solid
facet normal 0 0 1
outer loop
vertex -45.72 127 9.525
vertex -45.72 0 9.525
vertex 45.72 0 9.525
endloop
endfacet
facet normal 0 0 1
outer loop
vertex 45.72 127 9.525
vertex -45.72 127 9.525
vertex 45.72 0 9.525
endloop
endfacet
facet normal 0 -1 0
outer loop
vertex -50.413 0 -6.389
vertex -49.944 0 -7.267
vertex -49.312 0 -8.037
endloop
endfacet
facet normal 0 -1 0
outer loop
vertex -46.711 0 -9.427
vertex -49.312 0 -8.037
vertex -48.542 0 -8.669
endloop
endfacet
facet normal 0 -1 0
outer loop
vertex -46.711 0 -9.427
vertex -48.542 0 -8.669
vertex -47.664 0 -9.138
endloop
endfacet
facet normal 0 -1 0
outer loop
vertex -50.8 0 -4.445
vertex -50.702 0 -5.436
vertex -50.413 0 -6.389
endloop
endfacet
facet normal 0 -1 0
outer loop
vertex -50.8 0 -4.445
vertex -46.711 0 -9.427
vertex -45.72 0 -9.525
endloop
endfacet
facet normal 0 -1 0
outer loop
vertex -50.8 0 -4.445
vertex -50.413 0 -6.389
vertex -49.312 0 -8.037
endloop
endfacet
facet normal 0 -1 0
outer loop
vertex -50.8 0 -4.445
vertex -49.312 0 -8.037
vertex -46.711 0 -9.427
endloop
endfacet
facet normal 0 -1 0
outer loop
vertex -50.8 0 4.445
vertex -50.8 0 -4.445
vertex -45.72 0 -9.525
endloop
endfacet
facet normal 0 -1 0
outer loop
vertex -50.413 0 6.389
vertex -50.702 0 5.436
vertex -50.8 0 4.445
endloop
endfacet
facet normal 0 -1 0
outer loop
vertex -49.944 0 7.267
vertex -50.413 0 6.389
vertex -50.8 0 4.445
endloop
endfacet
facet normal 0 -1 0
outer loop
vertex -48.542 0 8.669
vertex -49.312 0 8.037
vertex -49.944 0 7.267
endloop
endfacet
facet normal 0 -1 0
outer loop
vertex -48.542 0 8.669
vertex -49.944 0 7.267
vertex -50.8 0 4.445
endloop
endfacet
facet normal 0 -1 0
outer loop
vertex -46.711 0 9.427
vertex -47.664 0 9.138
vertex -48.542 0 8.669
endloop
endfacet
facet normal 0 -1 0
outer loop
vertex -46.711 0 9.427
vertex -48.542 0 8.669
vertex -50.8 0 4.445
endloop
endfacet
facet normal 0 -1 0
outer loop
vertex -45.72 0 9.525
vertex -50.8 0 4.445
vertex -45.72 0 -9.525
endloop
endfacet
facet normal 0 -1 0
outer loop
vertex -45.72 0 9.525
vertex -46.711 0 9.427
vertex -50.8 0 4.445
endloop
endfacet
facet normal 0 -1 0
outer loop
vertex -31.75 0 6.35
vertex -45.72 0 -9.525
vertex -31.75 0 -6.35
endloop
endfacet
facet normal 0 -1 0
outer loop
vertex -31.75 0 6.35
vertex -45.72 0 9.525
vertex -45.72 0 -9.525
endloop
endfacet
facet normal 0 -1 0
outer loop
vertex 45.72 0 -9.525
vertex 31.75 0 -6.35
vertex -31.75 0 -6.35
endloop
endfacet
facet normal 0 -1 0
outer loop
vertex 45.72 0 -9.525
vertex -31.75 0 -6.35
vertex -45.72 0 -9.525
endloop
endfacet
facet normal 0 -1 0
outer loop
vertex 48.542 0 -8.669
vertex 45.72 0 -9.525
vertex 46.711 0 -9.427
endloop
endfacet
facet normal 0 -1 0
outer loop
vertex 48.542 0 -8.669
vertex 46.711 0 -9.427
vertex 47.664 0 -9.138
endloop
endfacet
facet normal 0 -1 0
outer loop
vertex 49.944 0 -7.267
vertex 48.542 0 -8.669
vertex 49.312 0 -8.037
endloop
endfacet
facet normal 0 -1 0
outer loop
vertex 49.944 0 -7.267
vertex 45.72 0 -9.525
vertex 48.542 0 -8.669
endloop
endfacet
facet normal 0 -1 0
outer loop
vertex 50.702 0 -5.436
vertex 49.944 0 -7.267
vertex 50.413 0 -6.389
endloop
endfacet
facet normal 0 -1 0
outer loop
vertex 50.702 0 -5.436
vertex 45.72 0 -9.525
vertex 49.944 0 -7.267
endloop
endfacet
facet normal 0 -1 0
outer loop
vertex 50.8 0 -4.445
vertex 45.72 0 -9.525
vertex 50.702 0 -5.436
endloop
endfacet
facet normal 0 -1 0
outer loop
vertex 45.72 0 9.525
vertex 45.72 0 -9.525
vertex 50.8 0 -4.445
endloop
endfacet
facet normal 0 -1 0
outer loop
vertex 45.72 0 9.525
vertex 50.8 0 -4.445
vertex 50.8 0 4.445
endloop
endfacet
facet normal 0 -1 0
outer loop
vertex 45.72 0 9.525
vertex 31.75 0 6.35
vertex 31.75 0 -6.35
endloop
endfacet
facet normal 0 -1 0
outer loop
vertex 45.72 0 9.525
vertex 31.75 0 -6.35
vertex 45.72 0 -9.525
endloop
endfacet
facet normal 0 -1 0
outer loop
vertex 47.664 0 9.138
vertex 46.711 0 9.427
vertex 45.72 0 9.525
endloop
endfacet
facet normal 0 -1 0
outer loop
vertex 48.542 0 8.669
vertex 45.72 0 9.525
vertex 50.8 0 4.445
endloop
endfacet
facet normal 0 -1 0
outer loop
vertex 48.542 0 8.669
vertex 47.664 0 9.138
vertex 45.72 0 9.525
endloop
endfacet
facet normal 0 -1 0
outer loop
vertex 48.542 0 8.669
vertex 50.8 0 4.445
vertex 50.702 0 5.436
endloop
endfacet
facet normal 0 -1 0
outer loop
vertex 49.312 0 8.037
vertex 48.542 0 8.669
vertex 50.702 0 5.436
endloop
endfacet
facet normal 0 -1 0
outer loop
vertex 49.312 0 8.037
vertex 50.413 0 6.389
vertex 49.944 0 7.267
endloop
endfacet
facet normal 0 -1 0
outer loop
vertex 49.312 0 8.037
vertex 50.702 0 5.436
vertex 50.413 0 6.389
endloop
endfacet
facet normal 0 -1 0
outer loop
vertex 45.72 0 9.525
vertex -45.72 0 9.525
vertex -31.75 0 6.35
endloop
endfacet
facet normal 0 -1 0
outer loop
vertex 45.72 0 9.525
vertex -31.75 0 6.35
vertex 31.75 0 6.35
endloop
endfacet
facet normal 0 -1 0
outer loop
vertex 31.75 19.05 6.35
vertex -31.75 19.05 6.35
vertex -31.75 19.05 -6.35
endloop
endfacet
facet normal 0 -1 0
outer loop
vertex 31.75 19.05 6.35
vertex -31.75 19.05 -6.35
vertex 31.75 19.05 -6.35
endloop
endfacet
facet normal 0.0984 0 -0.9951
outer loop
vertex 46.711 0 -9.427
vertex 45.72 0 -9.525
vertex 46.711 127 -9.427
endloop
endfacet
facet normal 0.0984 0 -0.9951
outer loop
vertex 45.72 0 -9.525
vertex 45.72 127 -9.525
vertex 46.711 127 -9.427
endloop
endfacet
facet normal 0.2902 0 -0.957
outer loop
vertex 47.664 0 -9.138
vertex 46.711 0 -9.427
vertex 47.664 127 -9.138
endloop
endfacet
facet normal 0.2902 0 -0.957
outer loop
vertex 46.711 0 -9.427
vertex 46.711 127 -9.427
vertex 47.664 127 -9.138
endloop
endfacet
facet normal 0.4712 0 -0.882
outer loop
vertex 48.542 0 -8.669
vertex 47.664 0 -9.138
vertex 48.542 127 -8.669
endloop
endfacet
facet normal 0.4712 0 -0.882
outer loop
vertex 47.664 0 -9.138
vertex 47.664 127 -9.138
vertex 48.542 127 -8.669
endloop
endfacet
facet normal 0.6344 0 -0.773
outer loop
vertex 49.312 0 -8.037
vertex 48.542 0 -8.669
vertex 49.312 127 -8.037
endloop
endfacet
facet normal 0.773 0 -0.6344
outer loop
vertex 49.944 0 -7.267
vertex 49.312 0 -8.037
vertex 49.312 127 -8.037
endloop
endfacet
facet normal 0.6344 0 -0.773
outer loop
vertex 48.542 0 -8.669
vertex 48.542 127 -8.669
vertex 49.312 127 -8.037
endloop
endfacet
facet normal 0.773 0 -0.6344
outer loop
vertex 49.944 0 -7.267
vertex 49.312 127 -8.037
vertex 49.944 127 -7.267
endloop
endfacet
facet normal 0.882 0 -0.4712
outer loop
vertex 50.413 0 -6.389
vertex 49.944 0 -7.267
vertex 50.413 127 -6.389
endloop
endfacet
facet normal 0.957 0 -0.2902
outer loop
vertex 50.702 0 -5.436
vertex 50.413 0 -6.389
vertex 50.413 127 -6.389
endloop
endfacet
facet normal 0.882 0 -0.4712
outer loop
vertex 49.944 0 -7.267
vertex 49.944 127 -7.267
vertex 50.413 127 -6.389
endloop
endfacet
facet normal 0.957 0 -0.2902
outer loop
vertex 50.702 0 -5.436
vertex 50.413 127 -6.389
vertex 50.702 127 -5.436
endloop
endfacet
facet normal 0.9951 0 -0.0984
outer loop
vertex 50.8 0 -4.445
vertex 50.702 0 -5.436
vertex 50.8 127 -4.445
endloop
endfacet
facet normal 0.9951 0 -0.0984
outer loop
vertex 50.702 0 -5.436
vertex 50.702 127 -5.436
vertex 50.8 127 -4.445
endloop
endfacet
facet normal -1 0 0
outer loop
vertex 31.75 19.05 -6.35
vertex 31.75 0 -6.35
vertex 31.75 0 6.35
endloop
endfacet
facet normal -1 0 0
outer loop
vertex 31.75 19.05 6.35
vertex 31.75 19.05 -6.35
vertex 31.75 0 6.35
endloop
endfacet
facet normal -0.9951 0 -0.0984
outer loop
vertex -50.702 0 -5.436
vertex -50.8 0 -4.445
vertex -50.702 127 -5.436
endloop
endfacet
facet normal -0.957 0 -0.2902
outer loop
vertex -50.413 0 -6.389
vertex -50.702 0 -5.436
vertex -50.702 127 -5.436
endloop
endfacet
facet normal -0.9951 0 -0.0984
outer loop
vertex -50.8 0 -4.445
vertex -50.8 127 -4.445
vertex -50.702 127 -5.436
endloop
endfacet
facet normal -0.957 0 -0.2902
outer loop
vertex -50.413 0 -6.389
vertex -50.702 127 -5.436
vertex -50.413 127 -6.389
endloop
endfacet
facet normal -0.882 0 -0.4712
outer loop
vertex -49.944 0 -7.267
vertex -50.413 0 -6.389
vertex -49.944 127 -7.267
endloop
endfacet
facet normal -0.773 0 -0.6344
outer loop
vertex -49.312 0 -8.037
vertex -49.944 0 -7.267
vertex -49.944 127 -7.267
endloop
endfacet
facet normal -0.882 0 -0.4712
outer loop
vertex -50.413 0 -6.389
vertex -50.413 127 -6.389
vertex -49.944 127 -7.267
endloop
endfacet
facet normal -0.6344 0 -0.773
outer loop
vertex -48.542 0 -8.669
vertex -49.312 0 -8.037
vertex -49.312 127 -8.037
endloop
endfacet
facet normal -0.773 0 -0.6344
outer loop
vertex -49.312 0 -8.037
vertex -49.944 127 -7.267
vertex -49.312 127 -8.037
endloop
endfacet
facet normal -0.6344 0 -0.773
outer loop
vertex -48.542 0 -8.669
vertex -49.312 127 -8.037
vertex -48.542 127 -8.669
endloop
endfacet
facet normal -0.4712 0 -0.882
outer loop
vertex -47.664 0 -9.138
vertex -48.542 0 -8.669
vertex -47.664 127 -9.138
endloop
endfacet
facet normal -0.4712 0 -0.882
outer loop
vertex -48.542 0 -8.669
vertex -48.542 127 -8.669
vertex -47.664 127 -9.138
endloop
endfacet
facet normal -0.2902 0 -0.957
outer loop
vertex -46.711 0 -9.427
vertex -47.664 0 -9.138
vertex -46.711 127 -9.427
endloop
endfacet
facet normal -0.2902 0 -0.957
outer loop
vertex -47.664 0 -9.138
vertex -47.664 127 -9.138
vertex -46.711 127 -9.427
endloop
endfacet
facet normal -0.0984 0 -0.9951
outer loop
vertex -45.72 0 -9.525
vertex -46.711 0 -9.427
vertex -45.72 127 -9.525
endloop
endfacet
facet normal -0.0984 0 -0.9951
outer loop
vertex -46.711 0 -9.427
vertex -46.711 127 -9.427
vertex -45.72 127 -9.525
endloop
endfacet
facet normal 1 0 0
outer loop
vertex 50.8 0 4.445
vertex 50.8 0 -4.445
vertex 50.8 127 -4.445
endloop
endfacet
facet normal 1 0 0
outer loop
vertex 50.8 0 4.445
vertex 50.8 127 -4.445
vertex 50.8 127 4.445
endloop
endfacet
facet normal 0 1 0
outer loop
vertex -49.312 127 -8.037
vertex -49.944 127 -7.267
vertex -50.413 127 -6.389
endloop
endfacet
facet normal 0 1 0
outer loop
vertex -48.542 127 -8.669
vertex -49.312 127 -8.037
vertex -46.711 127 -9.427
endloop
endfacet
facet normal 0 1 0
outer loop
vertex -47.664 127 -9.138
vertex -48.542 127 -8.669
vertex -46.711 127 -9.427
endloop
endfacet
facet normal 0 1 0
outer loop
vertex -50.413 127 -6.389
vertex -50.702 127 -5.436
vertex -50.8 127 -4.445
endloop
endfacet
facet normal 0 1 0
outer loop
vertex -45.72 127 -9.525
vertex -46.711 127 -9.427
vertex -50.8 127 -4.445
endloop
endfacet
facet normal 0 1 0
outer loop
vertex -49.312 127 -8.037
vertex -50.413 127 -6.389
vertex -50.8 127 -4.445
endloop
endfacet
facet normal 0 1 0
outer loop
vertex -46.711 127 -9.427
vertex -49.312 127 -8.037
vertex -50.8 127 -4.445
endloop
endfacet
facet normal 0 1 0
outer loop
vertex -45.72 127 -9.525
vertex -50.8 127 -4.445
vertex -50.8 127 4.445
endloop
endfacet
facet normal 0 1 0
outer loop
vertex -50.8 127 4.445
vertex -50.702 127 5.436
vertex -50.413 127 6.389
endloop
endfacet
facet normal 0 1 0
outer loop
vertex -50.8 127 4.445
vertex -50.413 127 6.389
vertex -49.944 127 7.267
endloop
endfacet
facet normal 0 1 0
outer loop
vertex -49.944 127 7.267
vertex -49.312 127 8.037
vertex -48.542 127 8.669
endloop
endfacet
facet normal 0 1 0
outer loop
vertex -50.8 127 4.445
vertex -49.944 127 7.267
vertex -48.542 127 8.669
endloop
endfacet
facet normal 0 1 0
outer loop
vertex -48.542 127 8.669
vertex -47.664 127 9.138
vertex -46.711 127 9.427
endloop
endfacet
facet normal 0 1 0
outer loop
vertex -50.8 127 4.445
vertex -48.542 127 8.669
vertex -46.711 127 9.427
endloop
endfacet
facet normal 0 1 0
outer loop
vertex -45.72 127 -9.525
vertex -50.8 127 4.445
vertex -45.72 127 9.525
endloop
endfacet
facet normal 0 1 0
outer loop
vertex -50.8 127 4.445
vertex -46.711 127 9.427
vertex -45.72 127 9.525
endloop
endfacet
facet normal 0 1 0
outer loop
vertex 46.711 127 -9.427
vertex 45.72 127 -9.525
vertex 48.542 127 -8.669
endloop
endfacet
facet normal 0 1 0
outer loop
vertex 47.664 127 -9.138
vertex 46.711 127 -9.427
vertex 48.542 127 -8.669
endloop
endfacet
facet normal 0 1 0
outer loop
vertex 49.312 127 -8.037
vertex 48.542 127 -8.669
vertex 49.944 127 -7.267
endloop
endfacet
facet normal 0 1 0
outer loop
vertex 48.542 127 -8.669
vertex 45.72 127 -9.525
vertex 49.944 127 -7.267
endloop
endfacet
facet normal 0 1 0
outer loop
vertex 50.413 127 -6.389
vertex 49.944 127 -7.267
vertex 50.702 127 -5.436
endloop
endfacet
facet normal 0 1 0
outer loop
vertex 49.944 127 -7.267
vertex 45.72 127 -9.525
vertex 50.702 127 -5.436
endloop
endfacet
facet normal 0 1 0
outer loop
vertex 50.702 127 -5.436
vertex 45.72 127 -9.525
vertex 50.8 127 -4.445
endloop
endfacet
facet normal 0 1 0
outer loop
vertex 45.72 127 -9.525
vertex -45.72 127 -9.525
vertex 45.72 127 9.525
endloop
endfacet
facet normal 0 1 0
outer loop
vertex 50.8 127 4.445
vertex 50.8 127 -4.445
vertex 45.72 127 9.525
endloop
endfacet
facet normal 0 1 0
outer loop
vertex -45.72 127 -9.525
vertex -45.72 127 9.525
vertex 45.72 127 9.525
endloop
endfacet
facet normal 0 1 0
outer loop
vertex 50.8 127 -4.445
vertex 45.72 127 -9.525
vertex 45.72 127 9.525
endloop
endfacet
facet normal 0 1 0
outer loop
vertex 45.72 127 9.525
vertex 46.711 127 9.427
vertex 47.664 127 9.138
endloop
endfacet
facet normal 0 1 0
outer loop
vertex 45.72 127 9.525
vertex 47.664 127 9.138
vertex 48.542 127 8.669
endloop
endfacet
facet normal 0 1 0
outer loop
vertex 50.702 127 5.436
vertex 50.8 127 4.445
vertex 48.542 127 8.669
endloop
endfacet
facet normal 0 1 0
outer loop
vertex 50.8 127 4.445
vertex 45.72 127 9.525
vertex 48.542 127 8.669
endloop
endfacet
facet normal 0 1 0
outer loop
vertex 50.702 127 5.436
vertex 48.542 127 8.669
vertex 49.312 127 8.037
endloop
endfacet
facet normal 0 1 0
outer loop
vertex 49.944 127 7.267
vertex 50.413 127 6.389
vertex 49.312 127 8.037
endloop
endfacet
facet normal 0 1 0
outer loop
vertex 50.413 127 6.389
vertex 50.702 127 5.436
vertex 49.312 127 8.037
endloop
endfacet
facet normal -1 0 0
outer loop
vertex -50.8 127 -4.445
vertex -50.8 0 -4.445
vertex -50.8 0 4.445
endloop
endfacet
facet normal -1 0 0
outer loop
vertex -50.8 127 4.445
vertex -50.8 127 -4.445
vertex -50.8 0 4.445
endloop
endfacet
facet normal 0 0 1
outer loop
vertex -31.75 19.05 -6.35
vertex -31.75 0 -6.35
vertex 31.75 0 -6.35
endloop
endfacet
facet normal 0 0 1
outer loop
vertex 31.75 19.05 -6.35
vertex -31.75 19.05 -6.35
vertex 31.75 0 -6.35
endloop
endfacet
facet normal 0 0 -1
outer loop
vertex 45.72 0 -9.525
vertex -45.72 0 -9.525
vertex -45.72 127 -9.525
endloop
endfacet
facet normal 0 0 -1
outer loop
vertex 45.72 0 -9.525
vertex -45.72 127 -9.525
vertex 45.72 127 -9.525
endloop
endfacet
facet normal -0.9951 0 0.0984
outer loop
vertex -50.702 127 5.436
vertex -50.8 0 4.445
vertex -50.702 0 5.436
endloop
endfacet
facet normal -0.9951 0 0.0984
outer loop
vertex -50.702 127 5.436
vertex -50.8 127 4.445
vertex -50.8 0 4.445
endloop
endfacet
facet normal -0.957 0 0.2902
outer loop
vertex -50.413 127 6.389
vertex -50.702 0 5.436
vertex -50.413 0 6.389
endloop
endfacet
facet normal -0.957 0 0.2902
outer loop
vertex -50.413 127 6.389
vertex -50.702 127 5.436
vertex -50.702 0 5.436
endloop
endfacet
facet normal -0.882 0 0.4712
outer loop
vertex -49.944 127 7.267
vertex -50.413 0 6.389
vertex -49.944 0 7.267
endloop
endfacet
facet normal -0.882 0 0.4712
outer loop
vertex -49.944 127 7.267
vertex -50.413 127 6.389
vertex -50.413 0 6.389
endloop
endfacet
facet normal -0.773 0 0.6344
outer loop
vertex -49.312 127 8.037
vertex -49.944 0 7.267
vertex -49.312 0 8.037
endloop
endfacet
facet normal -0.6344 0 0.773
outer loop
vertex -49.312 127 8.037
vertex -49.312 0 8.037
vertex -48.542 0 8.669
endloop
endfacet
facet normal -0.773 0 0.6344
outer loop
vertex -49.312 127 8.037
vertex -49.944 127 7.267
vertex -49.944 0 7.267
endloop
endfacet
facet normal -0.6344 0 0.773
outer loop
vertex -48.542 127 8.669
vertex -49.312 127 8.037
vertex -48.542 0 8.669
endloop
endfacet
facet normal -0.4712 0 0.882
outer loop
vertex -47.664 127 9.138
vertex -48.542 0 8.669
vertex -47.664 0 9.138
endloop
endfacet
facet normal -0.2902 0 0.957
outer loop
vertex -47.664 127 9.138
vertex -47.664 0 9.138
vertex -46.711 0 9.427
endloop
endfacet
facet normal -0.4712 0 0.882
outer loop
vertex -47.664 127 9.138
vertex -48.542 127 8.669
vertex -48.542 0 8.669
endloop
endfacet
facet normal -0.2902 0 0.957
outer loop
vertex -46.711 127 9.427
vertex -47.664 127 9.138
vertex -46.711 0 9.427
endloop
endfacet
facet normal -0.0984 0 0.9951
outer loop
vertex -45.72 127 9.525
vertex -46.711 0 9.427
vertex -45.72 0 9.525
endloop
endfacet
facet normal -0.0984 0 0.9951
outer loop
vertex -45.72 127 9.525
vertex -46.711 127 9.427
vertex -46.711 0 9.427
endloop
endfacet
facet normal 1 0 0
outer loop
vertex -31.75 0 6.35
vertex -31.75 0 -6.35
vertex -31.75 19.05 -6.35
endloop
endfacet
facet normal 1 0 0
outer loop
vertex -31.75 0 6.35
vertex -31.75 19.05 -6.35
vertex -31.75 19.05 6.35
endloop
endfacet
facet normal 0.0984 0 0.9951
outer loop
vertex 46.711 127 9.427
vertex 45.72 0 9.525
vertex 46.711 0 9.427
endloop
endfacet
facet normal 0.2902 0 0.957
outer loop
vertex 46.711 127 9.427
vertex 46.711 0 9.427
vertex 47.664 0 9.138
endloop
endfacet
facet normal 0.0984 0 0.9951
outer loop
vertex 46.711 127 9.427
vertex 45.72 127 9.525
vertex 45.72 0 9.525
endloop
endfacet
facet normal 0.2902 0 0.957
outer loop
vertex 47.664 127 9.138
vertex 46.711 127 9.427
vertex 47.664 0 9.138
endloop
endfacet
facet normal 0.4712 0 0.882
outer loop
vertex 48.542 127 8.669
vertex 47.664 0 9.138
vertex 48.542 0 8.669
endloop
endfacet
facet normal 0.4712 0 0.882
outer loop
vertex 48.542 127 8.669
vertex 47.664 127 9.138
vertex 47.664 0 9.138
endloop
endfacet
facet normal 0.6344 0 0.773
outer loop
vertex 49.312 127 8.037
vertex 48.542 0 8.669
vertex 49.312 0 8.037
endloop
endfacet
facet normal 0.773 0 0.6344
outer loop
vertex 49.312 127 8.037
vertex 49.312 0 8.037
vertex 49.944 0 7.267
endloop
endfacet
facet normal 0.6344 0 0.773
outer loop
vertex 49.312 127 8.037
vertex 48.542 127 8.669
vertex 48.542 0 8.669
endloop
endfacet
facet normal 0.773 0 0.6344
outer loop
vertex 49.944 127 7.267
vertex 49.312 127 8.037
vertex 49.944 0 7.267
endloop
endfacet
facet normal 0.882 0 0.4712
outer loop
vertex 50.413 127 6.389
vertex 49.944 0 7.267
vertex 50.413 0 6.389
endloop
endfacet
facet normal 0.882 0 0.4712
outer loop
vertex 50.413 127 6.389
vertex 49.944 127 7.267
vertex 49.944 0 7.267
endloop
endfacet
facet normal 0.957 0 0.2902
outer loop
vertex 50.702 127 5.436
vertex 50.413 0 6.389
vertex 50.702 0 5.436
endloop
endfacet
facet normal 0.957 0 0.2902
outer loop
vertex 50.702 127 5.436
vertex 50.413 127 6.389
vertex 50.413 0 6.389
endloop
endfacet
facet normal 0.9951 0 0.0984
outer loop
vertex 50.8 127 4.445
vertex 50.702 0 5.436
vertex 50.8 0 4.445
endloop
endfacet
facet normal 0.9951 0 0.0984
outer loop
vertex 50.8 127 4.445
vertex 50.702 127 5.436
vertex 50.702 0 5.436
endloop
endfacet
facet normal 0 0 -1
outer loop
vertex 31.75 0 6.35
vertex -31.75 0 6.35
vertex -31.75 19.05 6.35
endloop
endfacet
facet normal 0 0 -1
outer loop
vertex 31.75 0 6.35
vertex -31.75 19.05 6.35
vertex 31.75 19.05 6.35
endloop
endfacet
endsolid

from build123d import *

# Parameters (mm, degrees)
F0_W     = 101.6
F0_H     = 19.05
F2_DEPTH = 127
F1_W     = 63.5
F1_H     = 12.7
F3_DEPTH = 19.05
F4_R     = 5.08


with BuildPart() as f2:
    # F0 (on Front) → F2 (new body)
    with BuildSketch(Plane.XZ):
        Rectangle(F0_W, F0_H)
    extrude(amount=-F2_DEPTH)

    # F1 (on face) → F3 (cut)
    with BuildSketch(Plane.XZ):
        Rectangle(F1_W, F1_H)
    extrude(amount=-F3_DEPTH, mode=Mode.SUBTRACT)

    # F4
    f4_edges = [f2.edges().sort_by_distance(p)[0] for p in [
        (-50.8, 63.5, 9.525),
        (50.8, 63.5, 9.525),
        (50.8, 63.5, -9.525),
        (-50.8, 63.5, -9.525),
    ]]
    fillet(f4_edges, radius=F4_R)


solid = f2.part
